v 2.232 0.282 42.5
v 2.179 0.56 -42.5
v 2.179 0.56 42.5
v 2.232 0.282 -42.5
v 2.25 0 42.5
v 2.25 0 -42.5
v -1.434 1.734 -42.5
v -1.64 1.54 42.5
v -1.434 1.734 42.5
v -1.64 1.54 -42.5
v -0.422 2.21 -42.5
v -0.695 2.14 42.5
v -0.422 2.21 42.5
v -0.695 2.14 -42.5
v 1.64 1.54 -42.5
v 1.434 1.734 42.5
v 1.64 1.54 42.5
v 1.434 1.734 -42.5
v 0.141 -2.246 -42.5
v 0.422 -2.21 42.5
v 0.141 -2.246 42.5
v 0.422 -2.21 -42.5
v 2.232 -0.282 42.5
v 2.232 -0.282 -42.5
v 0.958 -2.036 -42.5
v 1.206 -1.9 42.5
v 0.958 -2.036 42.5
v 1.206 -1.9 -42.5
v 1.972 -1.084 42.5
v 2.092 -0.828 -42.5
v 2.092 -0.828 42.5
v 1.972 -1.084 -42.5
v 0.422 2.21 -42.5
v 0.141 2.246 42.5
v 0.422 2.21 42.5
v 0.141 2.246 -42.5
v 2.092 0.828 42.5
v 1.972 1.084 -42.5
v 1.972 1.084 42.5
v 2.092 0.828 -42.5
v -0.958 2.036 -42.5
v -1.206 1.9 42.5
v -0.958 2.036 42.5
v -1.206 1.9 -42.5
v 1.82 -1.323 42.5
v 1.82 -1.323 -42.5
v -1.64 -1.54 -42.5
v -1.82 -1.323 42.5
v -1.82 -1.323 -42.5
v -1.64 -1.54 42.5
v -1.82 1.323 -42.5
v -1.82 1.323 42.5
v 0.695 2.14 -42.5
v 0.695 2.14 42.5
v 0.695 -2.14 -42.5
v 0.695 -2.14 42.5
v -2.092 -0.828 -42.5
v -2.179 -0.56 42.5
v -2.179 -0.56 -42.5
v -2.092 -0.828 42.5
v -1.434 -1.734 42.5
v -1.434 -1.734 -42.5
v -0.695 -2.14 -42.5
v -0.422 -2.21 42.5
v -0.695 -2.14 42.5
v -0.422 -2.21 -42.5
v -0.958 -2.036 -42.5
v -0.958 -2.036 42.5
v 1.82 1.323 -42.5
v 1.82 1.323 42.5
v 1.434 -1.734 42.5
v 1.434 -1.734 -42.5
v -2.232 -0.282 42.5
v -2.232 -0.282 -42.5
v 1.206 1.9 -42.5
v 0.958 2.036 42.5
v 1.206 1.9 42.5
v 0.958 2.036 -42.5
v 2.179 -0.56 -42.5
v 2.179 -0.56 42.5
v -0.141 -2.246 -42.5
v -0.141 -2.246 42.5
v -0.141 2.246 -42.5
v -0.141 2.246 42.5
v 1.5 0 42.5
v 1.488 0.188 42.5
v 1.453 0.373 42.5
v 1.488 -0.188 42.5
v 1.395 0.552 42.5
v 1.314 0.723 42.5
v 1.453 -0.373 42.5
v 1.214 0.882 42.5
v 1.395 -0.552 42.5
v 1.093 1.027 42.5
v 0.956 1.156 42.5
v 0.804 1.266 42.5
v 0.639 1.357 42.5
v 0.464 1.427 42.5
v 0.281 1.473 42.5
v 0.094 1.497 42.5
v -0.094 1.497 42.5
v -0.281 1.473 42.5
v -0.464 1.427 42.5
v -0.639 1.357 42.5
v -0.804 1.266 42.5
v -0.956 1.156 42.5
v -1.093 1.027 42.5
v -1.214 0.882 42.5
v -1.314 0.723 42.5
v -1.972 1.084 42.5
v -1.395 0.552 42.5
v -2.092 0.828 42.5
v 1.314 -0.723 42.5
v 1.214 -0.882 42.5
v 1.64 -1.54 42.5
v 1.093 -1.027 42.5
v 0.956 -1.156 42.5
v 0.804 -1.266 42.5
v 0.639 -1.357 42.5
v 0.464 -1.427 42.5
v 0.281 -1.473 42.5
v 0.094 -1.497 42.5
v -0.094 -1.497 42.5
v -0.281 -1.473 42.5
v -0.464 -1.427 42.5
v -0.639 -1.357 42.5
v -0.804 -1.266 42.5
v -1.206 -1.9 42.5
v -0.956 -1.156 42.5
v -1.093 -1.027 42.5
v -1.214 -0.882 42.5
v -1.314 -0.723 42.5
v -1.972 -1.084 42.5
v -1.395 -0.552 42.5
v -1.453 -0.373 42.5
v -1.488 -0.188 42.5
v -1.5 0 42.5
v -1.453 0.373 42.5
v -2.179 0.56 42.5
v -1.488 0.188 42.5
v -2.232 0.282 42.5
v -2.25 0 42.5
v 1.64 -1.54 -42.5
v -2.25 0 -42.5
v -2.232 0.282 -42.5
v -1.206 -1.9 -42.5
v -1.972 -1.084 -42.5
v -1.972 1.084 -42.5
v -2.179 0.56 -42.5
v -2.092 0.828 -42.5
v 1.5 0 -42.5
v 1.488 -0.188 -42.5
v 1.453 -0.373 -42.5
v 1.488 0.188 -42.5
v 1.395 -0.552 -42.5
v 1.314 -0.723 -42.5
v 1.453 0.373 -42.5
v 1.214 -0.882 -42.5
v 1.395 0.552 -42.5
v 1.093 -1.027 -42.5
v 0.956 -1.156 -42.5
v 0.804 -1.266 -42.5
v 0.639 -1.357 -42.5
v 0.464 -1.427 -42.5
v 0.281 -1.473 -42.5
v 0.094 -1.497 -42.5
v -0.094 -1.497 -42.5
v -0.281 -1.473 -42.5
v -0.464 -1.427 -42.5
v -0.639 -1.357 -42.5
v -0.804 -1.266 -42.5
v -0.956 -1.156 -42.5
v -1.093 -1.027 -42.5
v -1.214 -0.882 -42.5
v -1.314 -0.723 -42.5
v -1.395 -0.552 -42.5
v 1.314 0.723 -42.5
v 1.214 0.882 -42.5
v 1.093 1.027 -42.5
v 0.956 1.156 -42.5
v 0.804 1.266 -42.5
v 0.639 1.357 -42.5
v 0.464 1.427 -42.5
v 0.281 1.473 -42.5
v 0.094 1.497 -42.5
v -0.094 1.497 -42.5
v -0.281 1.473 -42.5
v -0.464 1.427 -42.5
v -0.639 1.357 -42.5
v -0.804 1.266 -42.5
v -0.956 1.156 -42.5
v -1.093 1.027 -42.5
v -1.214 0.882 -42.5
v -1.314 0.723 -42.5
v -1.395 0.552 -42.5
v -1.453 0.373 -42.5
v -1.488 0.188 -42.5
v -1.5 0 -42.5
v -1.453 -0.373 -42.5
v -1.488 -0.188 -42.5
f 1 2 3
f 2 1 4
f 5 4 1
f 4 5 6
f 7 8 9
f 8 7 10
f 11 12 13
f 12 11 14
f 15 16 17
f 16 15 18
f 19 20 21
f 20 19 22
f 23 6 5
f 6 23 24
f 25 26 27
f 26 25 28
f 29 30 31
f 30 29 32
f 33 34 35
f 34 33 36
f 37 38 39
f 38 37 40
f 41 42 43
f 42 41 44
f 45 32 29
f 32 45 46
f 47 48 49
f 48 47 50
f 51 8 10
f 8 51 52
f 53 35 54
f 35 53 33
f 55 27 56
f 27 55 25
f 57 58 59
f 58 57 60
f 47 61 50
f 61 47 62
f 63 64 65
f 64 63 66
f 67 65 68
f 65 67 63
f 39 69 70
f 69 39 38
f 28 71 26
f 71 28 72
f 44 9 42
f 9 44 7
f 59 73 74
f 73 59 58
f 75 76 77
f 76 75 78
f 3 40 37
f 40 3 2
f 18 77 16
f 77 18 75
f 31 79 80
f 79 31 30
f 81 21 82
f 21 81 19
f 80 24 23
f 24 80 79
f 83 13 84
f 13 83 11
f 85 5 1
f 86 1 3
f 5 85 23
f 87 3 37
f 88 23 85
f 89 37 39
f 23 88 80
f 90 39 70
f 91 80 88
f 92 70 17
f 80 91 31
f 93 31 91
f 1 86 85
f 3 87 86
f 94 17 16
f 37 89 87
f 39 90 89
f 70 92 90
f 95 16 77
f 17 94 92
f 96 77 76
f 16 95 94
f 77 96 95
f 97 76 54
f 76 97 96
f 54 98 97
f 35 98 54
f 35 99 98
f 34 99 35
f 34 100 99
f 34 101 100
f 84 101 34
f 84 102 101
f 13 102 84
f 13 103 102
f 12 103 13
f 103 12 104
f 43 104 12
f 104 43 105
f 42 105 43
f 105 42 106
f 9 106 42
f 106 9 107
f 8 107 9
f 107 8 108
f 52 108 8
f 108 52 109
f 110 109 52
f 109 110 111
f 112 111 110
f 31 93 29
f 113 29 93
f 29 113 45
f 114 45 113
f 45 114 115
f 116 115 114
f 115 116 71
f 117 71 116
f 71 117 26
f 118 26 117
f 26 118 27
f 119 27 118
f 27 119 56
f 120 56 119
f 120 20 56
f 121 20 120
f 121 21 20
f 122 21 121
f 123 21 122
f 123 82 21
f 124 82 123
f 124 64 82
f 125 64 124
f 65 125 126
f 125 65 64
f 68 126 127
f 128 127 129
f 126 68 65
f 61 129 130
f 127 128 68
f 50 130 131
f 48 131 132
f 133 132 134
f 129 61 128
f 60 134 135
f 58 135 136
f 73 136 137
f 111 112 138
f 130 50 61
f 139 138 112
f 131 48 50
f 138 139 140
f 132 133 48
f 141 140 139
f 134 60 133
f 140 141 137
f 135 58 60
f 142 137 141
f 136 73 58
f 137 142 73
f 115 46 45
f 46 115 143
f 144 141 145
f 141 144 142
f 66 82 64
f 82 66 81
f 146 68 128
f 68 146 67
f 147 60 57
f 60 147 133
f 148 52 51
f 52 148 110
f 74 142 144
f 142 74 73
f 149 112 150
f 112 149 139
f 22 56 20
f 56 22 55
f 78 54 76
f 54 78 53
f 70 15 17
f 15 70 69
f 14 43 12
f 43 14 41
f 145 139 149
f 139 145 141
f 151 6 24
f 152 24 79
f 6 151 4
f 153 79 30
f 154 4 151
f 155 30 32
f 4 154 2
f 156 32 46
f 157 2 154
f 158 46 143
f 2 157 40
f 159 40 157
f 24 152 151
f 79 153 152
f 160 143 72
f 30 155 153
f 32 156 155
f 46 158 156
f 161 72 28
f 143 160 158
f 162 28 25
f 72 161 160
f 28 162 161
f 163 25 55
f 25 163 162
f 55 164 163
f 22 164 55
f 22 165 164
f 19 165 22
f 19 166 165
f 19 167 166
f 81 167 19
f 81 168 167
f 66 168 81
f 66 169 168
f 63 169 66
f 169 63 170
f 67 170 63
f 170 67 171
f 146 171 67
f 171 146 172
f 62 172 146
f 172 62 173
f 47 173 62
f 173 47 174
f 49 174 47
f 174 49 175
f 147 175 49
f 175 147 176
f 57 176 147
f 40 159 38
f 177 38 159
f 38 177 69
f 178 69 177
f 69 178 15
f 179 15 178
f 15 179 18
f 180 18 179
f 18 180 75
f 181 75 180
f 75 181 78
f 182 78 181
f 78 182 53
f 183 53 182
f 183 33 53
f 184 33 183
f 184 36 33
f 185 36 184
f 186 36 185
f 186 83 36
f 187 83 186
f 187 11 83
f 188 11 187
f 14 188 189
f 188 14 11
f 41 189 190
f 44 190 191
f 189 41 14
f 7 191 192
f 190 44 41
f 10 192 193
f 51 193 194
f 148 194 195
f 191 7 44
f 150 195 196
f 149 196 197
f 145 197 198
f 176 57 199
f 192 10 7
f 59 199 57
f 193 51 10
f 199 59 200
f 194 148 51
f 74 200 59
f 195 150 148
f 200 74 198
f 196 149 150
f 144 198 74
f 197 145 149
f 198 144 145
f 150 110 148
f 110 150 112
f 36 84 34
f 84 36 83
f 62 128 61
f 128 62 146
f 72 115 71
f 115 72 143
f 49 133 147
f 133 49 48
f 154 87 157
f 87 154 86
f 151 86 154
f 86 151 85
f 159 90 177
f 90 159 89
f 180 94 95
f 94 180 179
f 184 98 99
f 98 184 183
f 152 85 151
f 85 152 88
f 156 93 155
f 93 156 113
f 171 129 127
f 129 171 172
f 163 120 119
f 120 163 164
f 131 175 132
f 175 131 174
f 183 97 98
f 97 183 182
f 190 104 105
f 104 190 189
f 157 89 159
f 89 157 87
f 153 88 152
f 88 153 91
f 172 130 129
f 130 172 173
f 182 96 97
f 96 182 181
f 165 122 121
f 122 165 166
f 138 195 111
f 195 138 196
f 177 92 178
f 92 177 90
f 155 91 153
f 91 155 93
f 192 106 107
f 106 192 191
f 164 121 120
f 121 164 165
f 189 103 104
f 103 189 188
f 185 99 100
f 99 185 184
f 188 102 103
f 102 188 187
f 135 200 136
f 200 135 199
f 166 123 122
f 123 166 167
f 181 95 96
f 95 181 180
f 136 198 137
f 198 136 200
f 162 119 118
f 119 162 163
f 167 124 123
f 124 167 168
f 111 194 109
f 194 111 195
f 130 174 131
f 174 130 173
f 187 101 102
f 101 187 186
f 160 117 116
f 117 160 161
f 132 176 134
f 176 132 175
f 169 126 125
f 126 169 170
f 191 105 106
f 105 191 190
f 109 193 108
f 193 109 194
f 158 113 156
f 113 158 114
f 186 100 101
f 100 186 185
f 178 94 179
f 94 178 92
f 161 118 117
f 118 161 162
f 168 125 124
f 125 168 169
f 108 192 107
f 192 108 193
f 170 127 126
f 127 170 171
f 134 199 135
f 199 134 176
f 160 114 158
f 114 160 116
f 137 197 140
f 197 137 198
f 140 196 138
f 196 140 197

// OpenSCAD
$fn = 50;


difference() {
	union() {
		translate(v = [0, 0, -42.5000000000]) {
			cylinder(h = 85, r = 2.2500000000);
		}
	}
	union() {
		translate(v = [0, 0, -100.0000000000]) {
			cylinder(h = 200, r = 1.5000000000);
		}
	}
}
